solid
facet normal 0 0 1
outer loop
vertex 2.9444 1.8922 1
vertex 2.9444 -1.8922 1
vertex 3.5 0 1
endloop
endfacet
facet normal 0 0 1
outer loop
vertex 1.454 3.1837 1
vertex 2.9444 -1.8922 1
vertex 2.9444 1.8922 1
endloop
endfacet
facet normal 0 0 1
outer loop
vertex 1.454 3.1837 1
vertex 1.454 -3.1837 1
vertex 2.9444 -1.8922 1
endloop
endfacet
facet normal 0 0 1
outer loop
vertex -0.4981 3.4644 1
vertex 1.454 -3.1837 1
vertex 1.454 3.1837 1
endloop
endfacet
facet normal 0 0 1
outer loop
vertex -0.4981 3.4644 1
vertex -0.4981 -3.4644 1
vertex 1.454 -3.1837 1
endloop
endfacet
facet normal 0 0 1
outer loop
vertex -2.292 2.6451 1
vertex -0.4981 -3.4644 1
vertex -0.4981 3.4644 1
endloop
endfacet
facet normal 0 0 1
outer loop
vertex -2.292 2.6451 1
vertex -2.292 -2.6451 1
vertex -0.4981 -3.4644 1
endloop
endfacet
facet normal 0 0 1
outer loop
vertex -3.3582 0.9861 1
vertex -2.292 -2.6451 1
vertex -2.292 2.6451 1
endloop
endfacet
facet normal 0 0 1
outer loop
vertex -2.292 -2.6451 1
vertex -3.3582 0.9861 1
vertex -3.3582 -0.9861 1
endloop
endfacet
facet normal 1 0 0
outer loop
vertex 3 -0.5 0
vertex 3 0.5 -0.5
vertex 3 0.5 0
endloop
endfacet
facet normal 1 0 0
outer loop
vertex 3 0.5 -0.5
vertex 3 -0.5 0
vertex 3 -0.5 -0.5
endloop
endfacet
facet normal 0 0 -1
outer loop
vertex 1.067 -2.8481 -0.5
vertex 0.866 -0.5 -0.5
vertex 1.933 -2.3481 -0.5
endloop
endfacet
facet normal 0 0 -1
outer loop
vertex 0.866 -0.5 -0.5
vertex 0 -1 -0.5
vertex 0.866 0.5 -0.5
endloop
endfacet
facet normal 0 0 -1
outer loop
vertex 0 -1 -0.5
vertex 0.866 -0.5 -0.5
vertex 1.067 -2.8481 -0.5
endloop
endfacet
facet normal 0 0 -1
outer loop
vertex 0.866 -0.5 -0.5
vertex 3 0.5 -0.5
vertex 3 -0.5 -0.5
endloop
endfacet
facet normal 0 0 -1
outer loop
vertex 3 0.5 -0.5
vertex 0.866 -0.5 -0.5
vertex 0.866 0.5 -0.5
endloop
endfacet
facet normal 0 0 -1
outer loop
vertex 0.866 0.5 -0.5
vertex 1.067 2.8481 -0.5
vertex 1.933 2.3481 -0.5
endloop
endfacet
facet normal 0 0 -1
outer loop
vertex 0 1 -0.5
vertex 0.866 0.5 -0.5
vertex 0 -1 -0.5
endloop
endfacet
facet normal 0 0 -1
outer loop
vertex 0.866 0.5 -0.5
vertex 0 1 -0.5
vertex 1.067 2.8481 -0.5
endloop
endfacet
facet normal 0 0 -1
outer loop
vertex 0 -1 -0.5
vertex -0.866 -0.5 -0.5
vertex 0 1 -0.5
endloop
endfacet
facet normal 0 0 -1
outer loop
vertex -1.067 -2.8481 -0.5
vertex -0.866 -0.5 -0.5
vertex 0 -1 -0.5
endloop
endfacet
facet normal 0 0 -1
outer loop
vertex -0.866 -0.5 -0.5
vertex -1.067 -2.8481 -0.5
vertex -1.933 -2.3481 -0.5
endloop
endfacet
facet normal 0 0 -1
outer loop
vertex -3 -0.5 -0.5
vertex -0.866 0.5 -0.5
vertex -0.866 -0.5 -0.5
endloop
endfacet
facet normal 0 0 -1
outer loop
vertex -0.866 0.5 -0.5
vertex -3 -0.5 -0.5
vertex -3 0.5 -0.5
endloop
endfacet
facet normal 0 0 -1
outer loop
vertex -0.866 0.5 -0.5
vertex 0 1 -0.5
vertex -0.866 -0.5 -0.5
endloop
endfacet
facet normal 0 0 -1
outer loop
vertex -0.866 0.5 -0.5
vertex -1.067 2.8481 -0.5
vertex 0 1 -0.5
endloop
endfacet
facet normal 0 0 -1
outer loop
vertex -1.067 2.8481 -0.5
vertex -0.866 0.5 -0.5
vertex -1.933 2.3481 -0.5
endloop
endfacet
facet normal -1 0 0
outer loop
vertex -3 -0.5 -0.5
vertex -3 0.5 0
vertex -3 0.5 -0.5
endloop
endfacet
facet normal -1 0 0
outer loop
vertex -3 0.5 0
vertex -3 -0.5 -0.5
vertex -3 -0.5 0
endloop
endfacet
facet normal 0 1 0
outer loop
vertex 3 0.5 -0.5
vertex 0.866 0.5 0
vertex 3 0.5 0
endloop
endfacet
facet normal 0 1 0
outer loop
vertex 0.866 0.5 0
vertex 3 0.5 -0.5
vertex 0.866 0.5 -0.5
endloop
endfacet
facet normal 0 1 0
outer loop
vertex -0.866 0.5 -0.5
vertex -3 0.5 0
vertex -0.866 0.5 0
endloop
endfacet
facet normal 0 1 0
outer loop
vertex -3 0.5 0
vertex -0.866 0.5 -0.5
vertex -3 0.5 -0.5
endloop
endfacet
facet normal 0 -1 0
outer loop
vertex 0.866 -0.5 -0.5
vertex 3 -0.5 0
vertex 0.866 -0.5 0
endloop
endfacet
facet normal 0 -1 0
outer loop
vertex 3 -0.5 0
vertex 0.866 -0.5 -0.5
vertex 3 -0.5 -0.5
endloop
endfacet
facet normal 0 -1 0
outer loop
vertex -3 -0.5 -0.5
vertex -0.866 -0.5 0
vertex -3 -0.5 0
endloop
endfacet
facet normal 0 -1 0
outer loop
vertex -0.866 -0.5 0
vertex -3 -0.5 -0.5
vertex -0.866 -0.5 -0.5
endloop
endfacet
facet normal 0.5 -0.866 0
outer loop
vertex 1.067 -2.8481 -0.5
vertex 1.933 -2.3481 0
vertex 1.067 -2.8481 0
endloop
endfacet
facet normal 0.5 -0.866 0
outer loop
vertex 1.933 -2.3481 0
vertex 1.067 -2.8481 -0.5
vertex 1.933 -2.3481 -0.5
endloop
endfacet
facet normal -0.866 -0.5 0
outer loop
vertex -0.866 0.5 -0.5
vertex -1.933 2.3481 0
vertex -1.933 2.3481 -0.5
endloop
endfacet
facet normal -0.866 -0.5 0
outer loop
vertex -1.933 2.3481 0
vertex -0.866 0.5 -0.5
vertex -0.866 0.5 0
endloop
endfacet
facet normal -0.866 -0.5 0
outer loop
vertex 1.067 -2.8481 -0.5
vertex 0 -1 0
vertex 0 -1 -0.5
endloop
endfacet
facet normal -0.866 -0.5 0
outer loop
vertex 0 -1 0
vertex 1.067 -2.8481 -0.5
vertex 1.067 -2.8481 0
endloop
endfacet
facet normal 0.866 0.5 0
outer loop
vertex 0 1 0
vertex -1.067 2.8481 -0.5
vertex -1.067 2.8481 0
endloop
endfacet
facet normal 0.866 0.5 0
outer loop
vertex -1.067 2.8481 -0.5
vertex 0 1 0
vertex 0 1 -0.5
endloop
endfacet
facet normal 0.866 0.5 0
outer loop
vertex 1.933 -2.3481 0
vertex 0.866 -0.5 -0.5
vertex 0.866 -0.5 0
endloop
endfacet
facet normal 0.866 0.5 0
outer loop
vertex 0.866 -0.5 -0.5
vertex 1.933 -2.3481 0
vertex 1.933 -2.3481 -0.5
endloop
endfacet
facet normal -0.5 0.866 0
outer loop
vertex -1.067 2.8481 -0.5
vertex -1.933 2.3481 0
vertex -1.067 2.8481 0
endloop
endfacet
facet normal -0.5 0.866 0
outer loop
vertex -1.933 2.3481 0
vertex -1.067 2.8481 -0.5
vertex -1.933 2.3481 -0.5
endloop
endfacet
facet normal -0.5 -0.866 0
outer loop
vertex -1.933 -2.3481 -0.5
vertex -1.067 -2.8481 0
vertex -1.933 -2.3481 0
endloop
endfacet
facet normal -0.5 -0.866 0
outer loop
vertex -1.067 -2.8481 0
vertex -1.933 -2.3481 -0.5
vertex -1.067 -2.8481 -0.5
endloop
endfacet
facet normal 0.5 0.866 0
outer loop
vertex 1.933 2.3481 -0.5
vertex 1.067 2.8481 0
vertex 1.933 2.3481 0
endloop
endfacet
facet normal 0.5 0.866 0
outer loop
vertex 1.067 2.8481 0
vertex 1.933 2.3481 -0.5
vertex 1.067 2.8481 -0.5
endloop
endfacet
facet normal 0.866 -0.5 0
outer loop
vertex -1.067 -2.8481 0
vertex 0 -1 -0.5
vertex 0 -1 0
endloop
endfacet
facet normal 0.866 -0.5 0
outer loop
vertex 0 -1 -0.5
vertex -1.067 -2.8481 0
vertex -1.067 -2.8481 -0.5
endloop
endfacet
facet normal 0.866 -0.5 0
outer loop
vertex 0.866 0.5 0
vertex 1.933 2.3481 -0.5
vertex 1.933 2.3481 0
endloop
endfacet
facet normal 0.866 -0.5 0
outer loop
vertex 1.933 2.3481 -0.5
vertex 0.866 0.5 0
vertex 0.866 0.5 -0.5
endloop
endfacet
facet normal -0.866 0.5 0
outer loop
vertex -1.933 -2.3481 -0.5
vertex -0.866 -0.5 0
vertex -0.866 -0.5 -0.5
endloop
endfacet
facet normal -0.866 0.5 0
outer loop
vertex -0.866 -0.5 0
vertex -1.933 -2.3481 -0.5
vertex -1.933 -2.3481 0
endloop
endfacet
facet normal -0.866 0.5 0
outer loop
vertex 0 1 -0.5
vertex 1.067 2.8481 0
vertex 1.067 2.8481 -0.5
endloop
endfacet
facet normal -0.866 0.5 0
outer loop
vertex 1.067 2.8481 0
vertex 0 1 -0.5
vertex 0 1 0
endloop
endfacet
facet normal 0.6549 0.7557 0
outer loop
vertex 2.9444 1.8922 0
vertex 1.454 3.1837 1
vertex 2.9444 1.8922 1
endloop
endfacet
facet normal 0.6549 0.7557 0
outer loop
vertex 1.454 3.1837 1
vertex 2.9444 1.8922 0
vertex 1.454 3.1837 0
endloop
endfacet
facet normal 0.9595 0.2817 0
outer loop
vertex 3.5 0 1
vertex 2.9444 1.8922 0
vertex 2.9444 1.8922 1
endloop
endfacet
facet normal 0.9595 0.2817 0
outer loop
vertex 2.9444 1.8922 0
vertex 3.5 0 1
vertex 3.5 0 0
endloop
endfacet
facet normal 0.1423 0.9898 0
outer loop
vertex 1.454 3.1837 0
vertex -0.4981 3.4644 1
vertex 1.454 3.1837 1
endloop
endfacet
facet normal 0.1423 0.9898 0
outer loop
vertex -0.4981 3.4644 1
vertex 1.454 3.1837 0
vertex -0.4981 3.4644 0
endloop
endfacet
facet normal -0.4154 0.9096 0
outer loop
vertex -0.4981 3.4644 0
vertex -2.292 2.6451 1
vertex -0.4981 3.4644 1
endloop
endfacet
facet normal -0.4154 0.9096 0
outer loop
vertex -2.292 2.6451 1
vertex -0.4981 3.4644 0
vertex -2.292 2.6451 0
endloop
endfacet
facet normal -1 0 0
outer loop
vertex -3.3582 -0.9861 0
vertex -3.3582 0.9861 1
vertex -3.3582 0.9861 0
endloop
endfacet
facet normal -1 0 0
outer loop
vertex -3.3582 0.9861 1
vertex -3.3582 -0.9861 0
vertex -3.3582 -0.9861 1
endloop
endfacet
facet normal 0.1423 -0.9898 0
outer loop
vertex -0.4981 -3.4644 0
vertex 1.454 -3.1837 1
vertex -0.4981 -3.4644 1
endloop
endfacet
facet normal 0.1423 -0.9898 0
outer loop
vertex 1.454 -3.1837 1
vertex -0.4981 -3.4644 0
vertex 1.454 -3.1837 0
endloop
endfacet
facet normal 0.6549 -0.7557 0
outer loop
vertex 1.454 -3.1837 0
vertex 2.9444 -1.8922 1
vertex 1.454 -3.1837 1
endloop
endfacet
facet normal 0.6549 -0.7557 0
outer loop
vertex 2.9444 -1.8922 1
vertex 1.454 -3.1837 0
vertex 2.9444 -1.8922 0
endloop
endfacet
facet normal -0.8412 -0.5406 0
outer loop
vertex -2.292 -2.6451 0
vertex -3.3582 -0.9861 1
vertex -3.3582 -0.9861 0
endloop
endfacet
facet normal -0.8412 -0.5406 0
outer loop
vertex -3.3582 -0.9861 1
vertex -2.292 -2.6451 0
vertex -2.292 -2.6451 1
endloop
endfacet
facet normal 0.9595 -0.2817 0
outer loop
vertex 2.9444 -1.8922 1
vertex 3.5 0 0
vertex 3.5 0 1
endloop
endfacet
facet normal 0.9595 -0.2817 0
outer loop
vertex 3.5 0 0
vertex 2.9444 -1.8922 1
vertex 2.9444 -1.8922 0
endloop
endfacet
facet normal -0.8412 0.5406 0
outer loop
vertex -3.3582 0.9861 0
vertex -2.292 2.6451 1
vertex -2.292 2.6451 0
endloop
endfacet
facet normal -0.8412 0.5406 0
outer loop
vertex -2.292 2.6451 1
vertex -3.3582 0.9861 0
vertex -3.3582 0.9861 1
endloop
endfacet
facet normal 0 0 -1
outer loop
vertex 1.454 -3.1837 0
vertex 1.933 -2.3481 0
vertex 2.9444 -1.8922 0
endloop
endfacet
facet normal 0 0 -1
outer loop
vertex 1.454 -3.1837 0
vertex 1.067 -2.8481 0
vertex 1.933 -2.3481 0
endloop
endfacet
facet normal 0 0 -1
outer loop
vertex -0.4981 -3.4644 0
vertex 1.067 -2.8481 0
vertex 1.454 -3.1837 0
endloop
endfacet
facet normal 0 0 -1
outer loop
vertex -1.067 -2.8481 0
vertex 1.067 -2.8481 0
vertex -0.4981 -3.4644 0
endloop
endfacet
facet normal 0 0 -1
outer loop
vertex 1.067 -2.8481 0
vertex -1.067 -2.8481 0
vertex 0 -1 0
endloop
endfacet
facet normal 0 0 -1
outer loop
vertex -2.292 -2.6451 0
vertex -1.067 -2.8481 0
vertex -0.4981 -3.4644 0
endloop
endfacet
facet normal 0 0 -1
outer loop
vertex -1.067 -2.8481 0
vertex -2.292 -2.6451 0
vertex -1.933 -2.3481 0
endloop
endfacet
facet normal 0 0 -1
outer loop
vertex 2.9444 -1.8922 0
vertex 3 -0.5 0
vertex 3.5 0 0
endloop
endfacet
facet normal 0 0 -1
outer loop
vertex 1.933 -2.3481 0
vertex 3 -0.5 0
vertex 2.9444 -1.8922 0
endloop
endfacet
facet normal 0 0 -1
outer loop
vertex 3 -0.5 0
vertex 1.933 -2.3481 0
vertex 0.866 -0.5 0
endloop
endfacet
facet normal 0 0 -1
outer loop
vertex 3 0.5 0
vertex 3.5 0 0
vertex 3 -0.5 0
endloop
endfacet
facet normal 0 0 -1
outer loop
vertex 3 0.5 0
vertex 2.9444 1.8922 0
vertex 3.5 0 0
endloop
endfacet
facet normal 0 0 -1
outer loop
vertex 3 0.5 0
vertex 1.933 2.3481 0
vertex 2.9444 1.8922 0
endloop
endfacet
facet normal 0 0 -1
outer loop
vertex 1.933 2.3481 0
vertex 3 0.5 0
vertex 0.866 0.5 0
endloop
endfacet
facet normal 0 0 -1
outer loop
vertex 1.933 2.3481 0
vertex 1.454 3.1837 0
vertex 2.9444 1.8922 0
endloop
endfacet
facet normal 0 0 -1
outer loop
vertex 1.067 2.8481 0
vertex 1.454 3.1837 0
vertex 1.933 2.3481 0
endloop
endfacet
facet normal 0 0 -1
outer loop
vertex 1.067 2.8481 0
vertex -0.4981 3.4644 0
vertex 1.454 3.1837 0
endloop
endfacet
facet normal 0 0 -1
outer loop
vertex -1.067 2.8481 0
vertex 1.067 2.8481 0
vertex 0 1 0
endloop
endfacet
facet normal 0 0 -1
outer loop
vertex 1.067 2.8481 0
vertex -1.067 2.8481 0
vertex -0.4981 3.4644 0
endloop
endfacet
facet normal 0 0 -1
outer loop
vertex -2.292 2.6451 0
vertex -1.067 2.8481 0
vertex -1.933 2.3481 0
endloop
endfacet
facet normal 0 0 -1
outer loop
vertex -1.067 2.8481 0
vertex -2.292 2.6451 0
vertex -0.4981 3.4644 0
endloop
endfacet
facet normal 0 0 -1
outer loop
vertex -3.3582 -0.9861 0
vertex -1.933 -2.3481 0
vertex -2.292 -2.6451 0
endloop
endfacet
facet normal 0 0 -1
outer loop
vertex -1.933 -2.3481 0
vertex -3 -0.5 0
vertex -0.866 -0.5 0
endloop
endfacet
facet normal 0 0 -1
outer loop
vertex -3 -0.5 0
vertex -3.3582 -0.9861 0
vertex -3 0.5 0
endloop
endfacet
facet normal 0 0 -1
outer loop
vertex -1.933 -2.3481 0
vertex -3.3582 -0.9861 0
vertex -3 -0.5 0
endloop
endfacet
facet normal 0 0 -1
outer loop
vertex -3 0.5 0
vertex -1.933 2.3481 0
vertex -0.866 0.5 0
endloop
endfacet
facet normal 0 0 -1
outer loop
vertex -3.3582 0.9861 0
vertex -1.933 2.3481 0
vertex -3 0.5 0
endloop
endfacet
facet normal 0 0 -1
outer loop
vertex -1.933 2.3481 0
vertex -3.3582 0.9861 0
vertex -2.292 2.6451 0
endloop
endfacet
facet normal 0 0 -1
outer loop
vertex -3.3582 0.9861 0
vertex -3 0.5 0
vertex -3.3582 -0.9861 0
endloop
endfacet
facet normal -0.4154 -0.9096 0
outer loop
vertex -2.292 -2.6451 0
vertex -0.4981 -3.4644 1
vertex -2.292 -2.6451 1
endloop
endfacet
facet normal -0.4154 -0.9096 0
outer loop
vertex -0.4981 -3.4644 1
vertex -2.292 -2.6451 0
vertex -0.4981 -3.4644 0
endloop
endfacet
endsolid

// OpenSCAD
use <./libs/illumination.scad>

condenser_annulus_stl();

module condenser_annulus_stl() {
    condenser_annulus(3.5, 2, 3);
}
